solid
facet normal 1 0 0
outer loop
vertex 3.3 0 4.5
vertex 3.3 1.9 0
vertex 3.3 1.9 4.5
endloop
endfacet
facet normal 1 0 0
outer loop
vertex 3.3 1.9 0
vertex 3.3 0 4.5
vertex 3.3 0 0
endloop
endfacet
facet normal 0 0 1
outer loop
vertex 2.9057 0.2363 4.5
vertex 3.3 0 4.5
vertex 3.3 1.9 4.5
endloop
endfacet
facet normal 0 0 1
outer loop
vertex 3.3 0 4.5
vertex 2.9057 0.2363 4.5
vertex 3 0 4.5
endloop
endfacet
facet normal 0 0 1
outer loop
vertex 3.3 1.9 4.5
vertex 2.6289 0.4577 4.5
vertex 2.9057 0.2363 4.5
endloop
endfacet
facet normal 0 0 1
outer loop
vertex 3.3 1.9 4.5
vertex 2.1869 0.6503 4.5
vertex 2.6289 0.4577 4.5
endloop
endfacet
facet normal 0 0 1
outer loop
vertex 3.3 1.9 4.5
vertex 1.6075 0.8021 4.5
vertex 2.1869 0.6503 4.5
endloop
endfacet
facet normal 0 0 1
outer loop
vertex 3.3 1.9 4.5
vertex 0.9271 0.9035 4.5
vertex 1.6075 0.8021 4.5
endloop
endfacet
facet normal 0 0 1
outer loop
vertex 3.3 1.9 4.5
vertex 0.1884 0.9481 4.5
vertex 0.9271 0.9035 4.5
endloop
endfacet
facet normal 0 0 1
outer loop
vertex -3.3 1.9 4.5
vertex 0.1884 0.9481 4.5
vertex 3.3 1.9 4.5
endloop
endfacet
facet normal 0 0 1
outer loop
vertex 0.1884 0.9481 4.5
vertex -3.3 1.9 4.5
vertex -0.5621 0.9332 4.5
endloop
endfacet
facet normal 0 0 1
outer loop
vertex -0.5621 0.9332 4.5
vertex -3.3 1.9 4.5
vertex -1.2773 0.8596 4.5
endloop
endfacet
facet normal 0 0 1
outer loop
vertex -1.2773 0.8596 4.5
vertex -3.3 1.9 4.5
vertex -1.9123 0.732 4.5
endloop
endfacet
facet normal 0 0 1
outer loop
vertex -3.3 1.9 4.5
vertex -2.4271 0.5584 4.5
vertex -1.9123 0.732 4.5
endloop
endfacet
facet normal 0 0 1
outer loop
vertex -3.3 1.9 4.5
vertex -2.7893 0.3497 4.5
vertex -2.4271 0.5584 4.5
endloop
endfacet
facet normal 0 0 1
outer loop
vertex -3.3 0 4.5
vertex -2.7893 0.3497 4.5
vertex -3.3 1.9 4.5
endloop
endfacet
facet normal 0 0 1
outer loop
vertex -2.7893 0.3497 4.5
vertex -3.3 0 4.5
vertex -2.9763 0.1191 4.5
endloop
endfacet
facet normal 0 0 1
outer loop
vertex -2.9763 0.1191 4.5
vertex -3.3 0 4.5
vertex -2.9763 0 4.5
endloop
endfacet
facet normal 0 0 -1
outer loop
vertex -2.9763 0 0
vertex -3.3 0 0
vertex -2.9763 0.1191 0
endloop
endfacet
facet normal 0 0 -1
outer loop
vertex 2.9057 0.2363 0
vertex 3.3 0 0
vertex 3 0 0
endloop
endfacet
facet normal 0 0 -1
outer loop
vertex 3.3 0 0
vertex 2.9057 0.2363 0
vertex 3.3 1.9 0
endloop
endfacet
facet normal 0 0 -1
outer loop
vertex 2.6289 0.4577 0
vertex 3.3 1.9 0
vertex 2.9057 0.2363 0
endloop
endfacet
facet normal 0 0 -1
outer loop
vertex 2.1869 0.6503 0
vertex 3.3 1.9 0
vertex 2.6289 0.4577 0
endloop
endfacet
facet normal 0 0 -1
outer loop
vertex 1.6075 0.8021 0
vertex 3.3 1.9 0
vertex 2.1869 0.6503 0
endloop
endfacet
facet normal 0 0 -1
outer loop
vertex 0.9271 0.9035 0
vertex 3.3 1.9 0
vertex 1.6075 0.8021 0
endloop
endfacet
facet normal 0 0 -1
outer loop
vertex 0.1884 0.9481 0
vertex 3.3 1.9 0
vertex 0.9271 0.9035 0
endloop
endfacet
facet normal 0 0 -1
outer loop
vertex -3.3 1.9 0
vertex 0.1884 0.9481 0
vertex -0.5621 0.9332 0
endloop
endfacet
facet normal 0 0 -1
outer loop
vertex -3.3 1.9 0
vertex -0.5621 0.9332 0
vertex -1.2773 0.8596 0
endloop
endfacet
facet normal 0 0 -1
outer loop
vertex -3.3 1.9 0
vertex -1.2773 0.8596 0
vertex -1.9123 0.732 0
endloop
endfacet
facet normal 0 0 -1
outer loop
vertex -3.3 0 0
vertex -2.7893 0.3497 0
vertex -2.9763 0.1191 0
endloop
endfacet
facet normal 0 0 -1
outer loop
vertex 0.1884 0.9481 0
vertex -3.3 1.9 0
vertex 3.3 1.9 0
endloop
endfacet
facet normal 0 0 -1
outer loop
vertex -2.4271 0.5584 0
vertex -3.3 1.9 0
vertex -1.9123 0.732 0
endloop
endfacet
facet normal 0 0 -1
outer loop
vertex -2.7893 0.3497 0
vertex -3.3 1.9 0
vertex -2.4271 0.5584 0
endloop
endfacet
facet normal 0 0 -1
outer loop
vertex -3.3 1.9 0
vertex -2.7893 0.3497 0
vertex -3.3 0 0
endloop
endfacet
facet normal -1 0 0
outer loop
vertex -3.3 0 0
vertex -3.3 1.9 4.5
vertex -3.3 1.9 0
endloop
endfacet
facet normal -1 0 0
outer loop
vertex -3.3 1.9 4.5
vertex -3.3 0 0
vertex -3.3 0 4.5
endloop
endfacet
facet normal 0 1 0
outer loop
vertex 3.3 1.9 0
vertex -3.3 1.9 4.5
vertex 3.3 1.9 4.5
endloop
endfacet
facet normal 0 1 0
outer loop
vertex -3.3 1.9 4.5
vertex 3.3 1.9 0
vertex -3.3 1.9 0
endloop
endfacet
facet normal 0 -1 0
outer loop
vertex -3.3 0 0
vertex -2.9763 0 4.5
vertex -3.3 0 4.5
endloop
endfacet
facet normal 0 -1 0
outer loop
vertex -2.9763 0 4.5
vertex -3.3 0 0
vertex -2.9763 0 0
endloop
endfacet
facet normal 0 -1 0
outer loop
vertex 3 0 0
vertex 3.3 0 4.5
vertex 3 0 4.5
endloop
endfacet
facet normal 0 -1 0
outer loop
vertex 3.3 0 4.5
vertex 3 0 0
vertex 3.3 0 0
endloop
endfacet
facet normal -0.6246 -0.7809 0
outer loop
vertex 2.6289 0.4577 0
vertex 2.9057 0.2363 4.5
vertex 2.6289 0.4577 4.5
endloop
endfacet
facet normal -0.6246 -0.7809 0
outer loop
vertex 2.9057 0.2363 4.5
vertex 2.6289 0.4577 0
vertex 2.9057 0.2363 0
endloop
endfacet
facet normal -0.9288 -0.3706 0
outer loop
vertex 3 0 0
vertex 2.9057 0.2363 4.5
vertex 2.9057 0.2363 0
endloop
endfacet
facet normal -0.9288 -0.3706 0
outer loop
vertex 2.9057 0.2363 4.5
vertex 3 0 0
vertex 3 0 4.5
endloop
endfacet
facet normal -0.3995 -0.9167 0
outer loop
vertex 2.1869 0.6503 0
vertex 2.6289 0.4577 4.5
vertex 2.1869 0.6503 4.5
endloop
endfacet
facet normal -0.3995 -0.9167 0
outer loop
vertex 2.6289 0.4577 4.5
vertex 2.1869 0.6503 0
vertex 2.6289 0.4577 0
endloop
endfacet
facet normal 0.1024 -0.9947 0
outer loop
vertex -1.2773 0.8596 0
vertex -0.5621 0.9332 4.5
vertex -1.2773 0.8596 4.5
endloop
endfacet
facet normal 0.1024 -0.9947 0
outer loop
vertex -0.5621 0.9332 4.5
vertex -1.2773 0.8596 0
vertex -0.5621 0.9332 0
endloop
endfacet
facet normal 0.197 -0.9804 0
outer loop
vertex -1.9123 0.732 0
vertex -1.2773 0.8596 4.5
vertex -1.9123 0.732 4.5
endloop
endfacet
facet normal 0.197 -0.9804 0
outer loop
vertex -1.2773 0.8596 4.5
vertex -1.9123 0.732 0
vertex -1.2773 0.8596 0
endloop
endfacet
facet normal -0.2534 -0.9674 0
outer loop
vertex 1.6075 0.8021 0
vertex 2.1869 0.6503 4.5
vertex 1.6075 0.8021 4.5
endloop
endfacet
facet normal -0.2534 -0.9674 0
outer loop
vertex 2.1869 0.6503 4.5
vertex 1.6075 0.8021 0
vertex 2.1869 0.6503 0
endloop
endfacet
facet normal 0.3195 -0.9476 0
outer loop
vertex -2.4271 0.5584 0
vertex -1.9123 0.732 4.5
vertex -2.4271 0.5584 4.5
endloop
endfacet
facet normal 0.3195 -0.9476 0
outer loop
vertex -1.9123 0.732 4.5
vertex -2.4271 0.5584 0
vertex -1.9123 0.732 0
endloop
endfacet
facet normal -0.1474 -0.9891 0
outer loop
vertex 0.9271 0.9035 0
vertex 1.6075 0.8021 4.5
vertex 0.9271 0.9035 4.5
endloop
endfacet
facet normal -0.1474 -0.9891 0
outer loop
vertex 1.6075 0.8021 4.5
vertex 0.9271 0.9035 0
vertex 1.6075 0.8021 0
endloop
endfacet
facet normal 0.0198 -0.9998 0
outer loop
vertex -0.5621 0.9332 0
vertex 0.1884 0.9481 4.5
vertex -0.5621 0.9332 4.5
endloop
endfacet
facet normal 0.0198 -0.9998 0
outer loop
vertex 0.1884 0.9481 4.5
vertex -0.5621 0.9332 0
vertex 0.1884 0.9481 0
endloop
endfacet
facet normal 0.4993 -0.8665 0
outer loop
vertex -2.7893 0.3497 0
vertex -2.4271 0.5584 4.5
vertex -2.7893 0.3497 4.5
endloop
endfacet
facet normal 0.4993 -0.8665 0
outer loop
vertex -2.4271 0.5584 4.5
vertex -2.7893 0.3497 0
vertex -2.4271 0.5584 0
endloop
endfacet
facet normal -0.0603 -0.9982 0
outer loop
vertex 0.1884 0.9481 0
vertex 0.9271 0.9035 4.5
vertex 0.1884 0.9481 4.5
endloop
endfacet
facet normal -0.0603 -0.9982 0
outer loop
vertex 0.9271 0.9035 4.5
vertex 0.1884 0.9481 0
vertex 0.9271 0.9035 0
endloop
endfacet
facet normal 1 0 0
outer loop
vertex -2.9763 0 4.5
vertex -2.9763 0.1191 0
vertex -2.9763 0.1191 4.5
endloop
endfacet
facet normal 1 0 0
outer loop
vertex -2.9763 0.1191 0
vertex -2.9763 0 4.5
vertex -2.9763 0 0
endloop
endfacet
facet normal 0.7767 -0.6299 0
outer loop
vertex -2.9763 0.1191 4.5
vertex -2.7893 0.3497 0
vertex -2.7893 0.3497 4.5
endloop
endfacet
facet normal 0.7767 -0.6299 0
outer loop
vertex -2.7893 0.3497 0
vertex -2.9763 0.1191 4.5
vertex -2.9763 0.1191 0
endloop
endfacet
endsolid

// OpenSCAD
// Generated by SolidPython 1.1.3 on 2024-06-25 04:13:11
$fn = 25;


difference() {
	translate(v = [-3.3000000000, 0, 0]) {
		cube(size = [6.6000000000, 1.9000000000, 4.5000000000]);
	}
	scale(v = [6.0000000000, 1.9000000000, 1]) {
		cylinder(h = 5.0000000000, r = 0.5000000000);
	}
}
/***********************************************
*********      SolidPython code:      **********
************************************************
 
# SolidPython example code for illuminated Salzburg Feltenreitenschule
# Brygg Ullmer, Clemson University
# Written 2024-06-24

from solid import *  # load in SolidPython/SCAD support code; solid2?
      
#dimensions in mm, mating to 144/m LED strip

elDim = {'arch': [6. , 1.9, 5.], 'dentil': [1.34, .56, 2.5], 
         'box':  [6.4, 4.7, 2.], 'column': [1.,  4.7, None]}

perBoxGeoms  = {}; boxWidth = elDim['box'][0] + elDim['column'][0]

for elName in ['column', 'dentil']: #create cubical masses for columns and dentils
  w,h,d = elDim[elName]; perBoxGeoms[elName] = cube([w,h,d])

aw, ah, ad  = elDim['arch']                # Prep to carve the arch
archCyl1    = cylinder(r=.5, h=ad)         # We'll excise this cylinder from the archCutter
archCyl2    = scale([aw, ah, 1])(archCyl1) # scaling it per elDimensions
archCutter1 = cube([aw*1.1, ah, ad*.9])        # and borrow the archs dimensions, with less depth
archCutter2 = translate([-aw*1.1/2., 0, 0])(archCutter1) #shifting it appropriately
archCutter3 = archCutter2 - archCyl2       # now, Boolean-subtract the cylindrical void 

outGeom = archCutter3

radialSegments = 25;     hdr = '$fn = %s;' % radialSegments # create a header for the export
scad_render_to_file(outGeom, 'frs01.scad', file_header=hdr) # write the .scad file

### end ###

 
 
************************************************/
